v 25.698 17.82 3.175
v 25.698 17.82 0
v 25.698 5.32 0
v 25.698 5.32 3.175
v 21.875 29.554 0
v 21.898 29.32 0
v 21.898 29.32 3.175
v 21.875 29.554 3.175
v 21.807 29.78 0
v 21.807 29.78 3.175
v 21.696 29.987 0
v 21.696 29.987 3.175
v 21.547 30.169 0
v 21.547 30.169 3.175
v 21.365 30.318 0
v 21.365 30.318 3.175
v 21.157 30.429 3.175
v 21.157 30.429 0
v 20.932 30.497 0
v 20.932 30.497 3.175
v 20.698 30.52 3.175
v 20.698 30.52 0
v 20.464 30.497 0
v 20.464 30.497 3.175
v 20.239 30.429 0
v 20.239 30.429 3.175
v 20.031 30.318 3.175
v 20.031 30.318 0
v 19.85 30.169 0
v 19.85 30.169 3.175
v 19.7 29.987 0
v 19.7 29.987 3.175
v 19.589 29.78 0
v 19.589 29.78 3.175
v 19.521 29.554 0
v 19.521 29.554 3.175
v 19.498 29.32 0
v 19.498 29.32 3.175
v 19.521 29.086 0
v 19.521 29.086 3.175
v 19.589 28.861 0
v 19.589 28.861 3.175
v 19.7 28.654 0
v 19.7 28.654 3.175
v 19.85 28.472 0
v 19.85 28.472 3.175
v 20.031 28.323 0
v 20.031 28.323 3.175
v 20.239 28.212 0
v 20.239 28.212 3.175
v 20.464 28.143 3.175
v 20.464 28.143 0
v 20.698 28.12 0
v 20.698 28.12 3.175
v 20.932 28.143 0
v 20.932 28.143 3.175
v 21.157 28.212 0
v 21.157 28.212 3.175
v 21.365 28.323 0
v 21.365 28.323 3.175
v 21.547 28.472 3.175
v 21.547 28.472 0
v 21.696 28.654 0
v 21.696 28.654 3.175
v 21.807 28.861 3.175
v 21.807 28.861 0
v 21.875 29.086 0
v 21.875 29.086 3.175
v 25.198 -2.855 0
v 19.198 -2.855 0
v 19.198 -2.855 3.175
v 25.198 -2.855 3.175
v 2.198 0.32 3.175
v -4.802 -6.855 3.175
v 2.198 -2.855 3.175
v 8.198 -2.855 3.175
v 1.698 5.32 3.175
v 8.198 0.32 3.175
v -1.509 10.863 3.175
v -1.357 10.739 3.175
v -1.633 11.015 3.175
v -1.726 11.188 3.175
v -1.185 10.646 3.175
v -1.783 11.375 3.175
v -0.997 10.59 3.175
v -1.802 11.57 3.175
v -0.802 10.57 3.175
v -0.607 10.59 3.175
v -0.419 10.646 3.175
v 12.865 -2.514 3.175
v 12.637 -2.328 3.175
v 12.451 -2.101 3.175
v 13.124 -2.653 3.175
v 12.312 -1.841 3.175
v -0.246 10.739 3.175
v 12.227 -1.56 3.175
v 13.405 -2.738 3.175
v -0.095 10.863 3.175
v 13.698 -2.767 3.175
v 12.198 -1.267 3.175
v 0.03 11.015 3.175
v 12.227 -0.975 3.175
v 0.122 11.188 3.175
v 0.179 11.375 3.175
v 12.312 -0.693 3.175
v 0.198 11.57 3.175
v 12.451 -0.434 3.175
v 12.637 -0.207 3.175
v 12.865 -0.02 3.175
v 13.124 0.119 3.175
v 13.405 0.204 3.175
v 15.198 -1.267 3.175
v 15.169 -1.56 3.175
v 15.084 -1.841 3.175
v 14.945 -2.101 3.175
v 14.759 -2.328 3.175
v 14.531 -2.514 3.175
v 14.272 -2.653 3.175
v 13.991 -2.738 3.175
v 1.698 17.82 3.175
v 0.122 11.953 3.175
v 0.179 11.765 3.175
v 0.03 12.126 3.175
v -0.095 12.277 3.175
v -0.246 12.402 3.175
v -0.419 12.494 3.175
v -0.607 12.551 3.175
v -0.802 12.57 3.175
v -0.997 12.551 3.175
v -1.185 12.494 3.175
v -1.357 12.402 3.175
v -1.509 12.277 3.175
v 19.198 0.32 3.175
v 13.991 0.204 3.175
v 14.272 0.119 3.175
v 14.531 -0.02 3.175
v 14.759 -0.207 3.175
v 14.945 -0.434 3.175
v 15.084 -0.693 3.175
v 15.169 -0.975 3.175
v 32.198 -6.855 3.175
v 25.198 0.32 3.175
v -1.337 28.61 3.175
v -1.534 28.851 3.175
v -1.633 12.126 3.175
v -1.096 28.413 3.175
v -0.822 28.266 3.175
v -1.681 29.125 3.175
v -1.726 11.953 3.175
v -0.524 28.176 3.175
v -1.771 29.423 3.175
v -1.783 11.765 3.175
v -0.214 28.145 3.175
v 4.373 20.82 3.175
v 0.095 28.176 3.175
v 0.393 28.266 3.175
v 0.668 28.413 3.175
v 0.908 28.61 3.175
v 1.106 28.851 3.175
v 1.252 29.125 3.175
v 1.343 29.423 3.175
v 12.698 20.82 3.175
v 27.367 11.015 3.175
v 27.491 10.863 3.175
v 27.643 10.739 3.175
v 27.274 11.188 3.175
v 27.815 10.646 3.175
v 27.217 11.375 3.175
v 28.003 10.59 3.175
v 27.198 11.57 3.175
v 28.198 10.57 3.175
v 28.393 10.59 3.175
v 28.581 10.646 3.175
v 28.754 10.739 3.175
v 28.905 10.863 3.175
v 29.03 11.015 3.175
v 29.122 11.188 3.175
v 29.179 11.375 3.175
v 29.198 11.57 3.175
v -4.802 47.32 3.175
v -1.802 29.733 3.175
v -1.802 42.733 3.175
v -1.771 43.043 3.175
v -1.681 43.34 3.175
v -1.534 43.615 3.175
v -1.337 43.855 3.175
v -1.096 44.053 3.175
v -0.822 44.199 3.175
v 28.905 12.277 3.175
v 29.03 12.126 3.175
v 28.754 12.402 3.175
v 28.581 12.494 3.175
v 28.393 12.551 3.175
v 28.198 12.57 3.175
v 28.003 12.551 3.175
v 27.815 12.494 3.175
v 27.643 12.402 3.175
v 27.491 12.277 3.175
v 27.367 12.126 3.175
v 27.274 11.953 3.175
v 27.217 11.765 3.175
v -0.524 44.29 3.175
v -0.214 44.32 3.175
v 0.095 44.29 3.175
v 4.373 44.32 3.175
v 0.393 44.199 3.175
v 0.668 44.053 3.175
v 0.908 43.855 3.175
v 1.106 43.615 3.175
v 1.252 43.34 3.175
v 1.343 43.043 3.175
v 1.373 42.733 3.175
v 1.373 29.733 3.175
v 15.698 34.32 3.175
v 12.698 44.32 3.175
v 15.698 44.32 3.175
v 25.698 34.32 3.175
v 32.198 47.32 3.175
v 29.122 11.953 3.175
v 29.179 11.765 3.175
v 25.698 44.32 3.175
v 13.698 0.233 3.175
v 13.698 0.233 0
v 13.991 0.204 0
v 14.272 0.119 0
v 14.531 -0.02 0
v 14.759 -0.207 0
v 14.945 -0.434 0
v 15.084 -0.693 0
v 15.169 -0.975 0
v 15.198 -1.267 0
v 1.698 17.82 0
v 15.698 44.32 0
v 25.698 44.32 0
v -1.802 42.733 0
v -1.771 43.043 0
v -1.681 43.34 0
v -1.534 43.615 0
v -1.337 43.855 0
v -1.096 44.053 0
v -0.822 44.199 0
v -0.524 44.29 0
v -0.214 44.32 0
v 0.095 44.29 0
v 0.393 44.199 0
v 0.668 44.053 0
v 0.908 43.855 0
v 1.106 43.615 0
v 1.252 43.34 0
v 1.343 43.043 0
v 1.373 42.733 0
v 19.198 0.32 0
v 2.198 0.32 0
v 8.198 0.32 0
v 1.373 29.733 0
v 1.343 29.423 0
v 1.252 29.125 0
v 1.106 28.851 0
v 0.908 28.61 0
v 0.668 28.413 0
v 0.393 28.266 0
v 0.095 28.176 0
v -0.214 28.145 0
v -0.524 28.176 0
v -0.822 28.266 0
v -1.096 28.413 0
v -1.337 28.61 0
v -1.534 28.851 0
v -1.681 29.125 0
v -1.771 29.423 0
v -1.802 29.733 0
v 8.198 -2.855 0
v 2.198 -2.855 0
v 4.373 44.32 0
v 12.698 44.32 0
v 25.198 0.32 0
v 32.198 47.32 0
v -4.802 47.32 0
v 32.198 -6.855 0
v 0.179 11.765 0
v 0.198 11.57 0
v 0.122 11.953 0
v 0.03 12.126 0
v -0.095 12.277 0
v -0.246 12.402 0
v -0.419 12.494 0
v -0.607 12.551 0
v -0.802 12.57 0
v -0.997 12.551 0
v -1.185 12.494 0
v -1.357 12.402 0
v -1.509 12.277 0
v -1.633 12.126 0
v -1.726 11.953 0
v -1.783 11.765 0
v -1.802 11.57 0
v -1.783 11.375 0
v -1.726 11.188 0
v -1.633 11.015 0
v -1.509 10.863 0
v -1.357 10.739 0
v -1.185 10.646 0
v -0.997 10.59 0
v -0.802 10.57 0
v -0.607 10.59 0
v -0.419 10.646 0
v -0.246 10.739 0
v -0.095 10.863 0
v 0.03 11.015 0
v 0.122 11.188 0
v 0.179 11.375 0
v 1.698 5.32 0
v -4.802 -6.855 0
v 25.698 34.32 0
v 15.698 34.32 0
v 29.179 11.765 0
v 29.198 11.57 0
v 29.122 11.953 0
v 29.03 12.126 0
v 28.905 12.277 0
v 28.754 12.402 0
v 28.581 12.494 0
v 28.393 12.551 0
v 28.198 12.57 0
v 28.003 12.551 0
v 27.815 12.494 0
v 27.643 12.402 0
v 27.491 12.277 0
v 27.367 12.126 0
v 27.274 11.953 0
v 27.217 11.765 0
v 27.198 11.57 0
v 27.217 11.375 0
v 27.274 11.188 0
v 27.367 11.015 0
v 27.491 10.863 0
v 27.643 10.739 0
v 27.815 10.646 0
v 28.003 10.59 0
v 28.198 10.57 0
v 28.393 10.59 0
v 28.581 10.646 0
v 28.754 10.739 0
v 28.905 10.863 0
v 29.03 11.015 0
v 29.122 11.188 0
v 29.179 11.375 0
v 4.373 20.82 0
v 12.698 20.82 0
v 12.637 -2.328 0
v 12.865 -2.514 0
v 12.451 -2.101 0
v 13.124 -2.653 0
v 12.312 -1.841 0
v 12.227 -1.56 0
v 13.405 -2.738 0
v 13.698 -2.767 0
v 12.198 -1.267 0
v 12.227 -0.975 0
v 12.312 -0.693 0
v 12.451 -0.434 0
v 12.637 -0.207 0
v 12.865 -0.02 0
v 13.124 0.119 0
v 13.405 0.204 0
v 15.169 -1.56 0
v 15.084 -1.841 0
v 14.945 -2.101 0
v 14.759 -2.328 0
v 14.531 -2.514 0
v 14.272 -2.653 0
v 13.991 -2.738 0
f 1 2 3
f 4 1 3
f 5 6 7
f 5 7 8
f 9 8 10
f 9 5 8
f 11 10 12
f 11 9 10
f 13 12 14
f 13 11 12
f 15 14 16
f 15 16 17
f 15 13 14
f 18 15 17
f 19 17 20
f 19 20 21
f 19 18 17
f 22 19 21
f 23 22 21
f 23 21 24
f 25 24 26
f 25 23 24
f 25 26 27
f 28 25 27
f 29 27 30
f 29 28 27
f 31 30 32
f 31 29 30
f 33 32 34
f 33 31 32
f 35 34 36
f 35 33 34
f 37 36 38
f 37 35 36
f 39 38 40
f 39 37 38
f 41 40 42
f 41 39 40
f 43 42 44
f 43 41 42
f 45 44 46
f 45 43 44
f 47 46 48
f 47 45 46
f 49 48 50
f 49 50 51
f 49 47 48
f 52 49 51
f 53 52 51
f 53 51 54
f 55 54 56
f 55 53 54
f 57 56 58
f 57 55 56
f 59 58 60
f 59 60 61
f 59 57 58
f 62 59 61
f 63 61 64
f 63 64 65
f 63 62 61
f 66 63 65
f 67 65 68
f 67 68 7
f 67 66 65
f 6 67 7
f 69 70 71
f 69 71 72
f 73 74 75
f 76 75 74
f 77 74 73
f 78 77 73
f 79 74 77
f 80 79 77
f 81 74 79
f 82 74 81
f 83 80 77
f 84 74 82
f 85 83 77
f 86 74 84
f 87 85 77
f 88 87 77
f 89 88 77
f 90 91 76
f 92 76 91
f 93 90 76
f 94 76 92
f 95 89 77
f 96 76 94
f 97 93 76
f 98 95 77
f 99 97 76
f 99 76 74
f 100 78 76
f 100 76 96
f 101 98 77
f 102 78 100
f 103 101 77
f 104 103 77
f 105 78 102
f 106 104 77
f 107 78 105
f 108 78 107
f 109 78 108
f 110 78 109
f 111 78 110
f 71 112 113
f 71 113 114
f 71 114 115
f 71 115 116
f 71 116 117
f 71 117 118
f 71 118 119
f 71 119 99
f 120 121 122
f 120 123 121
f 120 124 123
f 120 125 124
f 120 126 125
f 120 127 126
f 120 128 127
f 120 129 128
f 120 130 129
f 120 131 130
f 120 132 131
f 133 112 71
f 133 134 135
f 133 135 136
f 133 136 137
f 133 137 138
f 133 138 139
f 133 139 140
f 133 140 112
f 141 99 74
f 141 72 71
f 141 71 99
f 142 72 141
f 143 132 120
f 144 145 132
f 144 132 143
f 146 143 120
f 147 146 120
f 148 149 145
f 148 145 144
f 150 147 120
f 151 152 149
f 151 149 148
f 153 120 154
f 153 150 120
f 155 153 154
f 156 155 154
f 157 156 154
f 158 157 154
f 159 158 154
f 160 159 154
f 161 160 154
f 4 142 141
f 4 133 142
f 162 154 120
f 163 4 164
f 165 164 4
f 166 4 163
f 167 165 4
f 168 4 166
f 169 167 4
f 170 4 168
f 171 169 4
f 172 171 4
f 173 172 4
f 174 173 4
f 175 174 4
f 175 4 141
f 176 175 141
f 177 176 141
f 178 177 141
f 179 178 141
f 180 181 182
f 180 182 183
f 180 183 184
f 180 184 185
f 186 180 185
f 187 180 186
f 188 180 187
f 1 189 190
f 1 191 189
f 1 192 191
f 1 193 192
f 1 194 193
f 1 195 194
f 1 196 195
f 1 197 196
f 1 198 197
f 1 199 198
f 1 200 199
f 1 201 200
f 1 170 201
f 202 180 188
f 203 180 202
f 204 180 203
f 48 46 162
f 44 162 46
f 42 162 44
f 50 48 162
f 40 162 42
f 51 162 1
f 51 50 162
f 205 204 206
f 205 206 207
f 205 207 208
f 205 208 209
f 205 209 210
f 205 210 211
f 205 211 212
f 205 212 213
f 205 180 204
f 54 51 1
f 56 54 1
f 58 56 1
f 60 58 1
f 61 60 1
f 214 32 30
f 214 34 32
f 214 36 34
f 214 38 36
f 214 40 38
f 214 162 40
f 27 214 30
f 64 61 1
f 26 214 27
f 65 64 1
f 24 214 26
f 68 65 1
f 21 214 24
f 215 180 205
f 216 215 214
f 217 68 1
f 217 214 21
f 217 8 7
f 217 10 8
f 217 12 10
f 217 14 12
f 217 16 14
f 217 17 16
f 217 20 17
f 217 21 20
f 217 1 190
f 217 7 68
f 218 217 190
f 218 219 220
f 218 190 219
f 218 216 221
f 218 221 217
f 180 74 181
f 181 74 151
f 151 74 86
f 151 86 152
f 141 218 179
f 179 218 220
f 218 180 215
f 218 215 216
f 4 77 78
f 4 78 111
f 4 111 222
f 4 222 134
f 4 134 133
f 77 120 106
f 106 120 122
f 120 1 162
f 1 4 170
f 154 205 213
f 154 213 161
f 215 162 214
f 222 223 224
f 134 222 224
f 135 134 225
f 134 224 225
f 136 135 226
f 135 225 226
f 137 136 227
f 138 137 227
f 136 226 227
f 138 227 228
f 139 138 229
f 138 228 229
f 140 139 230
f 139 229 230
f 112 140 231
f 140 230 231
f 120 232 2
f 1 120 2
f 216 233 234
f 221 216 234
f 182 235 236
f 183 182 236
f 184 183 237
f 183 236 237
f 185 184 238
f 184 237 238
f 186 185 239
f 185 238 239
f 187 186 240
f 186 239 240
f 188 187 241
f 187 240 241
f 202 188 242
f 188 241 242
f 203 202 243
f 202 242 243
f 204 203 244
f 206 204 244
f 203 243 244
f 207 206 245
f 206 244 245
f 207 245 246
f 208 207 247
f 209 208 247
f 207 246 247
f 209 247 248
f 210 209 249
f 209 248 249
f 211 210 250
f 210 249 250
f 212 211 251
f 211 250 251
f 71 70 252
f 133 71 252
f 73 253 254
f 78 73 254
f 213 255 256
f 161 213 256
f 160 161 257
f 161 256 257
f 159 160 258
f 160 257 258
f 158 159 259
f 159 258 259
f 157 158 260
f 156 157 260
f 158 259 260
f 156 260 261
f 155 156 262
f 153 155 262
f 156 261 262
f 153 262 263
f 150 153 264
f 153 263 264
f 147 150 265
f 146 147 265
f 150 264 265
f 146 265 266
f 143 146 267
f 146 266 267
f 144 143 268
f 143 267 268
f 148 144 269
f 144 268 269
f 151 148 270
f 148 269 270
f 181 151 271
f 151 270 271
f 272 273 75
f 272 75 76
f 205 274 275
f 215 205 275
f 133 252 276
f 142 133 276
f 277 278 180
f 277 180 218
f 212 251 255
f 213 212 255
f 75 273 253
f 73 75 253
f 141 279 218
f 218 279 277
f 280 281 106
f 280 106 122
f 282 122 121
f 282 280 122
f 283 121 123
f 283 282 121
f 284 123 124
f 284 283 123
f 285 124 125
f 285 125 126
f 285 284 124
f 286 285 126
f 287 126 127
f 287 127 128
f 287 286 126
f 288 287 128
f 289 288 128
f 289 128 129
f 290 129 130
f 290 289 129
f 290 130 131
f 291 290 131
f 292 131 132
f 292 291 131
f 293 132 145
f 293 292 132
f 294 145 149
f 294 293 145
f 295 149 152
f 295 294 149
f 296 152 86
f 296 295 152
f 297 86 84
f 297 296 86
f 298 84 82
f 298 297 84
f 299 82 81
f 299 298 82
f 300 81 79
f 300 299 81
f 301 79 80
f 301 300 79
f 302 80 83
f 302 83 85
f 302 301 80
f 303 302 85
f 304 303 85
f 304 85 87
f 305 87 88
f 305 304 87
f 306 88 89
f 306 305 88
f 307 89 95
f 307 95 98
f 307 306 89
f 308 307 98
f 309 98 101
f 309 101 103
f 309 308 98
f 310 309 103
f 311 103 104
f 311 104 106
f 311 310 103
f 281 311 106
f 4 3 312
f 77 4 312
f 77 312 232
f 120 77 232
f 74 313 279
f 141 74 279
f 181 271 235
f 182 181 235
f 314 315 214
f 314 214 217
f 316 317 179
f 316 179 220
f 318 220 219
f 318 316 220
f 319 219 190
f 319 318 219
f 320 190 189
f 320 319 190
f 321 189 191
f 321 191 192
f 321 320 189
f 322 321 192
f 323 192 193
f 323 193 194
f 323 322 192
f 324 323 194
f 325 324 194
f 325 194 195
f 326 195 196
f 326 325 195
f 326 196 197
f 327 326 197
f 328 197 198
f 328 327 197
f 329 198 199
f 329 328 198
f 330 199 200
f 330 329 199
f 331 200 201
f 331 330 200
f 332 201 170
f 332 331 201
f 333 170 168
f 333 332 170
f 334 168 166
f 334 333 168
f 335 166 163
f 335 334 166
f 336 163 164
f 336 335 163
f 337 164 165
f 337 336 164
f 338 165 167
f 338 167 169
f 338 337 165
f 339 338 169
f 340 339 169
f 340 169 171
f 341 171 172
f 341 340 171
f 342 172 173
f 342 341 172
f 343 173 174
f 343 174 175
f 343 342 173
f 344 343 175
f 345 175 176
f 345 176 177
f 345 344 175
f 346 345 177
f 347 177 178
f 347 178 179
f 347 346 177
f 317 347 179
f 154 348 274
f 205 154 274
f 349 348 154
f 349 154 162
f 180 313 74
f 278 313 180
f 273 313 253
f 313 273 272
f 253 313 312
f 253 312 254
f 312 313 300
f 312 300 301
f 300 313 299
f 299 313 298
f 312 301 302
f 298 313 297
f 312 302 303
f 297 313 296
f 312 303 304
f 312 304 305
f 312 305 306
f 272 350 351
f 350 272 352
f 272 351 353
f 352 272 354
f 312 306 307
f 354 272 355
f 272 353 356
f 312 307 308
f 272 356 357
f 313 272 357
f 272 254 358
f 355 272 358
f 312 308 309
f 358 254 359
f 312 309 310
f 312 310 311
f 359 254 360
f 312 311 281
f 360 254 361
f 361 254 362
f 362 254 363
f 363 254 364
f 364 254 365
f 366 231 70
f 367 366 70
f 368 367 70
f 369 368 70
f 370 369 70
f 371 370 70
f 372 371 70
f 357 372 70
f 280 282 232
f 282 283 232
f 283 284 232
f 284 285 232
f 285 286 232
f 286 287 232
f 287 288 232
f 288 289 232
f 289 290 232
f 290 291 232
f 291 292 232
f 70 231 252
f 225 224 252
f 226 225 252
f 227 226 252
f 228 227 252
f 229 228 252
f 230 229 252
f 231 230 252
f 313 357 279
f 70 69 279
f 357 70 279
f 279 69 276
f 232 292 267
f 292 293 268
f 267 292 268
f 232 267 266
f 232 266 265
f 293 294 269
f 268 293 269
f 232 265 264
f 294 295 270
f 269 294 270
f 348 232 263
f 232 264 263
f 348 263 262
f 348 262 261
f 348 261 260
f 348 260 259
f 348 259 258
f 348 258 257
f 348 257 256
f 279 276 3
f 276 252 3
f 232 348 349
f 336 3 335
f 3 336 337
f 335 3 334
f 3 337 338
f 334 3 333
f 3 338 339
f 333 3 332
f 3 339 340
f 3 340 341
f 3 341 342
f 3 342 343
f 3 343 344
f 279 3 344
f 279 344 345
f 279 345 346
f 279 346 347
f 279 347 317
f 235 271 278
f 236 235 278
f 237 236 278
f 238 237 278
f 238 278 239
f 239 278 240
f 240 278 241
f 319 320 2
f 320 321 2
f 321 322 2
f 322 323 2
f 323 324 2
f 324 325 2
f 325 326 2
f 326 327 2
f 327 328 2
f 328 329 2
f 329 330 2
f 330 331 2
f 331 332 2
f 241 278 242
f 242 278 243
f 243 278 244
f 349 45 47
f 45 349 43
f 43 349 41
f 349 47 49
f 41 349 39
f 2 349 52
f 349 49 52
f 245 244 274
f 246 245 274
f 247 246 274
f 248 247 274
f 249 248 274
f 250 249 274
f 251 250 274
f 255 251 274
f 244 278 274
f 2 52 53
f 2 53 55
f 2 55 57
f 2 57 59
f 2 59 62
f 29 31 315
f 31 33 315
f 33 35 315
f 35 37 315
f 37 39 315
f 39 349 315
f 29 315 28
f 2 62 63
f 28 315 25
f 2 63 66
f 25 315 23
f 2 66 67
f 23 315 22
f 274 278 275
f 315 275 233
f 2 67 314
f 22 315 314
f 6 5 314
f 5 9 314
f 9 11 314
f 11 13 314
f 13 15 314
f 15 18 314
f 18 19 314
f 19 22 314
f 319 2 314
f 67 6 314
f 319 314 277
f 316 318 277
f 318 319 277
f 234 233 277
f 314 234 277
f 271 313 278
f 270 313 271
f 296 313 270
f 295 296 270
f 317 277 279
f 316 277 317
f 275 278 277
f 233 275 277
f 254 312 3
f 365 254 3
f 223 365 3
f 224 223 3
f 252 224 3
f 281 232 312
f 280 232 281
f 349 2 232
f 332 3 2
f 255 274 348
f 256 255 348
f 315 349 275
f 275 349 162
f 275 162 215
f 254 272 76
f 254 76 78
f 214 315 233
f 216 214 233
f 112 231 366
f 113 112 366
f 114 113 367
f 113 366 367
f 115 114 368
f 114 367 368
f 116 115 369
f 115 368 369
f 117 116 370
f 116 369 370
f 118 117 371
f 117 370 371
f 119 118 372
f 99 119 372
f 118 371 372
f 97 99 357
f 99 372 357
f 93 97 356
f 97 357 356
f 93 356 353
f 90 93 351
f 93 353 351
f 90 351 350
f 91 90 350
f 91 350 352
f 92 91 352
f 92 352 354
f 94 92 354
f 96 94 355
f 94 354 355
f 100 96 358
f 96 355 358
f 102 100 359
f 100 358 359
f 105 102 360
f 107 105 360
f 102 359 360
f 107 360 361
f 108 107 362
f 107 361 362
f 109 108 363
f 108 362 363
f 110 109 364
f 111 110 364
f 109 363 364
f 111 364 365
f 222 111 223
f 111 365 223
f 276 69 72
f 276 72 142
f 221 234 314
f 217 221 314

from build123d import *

# Parameters (mm, degrees)
F0_W     = 37
F0_H     = 54.175
F0_W_2   = 6
F0_H_2   = 3.175
F0_R     = 1
F0_W_3   = 8.325
F0_H_3   = 23.5
F0_W_4   = 10
F0_H_4   = 10
F0_R_2   = 1.2
F1_DEPTH = 3.175


# Not quite as in the source:
# - a length typed as a fraction of an inch, garbled in the dataset ("3 / 203.2 mm" for 3/8 in), is restored
# - a feature names something its author has since deleted; it is built from what else it names


with BuildPart() as f1:
    # F0 (on Top) → F1 (new body)
    with BuildSketch(Plane.XY):
        with Locations((13.6980720539, 20.2328219792)):
            Rectangle(F0_W, F0_H)
        with Locations((5.1980720539, -1.2671780208)):
            Rectangle(F0_W_2, F0_H_2, mode=Mode.SUBTRACT)
        with Locations((-0.8019279461, 11.5703219792)):
            Circle(F0_R, mode=Mode.SUBTRACT)
        with BuildLine():
            ThreePointArc((13.6980720539, 0.2328219792), (14.7587322257, -0.2065178491), (15.1980720539, -1.2671780208))
            ThreePointArc((15.1980720539, -1.2671780208), (12.6374118822, -2.3278381926), (13.6980720539, 0.2328219792))
        make_face(mode=Mode.SUBTRACT)
        with Locations((22.1980720539, -1.2671780208)):
            Rectangle(F0_W_2, F0_H_2, mode=Mode.SUBTRACT)
        Polygon((1.6980720539, 5.3203219792), (1.6980720539, 17.8203219792), (13.6980720539, 17.8203219792), (25.6980720539, 17.8203219792), (25.6980720539, 5.3203219792), align=None, mode=Mode.SUBTRACT)
        with Locations((28.1980720539, 11.5703219792)):
            Circle(F0_R, mode=Mode.SUBTRACT)
        with Locations((8.5355720539, 32.5703219792)):
            Rectangle(F0_W_3, F0_H_3, mode=Mode.SUBTRACT)
        with BuildLine():
            ThreePointArc((-1.8019279461, 42.7328219792), (-0.2144279461, 44.3203219792), (1.3730720539, 42.7328219792))
            Line((1.3730720539, 42.7328219792), (1.3730720539, 29.7328219792))
            ThreePointArc((1.3730720539, 29.7328219792), (-0.2144279461, 28.1453219792), (-1.8019279461, 29.7328219792))
            Line((-1.8019279461, 29.7328219792), (-1.8019279461, 42.7328219792))
        make_face(mode=Mode.SUBTRACT)
        Polygon((15.6980720539, 24.3203219792), (15.6980720539, 34.3203219792), (15.6980720539, 44.3203219792), (25.6980720539, 44.3203219792), (25.6980720539, 34.3203219792), (25.6980720539, 24.3203219792), align=None, mode=Mode.SUBTRACT)
        with Locations((20.6980720539, 29.3203219792)):
            Rectangle(F0_W_4, F0_H_4)
        with Locations((20.6980720539, 29.3203219792)):
            Circle(F0_R_2, mode=Mode.SUBTRACT)
    extrude(amount=F1_DEPTH)


solid = f1.part
